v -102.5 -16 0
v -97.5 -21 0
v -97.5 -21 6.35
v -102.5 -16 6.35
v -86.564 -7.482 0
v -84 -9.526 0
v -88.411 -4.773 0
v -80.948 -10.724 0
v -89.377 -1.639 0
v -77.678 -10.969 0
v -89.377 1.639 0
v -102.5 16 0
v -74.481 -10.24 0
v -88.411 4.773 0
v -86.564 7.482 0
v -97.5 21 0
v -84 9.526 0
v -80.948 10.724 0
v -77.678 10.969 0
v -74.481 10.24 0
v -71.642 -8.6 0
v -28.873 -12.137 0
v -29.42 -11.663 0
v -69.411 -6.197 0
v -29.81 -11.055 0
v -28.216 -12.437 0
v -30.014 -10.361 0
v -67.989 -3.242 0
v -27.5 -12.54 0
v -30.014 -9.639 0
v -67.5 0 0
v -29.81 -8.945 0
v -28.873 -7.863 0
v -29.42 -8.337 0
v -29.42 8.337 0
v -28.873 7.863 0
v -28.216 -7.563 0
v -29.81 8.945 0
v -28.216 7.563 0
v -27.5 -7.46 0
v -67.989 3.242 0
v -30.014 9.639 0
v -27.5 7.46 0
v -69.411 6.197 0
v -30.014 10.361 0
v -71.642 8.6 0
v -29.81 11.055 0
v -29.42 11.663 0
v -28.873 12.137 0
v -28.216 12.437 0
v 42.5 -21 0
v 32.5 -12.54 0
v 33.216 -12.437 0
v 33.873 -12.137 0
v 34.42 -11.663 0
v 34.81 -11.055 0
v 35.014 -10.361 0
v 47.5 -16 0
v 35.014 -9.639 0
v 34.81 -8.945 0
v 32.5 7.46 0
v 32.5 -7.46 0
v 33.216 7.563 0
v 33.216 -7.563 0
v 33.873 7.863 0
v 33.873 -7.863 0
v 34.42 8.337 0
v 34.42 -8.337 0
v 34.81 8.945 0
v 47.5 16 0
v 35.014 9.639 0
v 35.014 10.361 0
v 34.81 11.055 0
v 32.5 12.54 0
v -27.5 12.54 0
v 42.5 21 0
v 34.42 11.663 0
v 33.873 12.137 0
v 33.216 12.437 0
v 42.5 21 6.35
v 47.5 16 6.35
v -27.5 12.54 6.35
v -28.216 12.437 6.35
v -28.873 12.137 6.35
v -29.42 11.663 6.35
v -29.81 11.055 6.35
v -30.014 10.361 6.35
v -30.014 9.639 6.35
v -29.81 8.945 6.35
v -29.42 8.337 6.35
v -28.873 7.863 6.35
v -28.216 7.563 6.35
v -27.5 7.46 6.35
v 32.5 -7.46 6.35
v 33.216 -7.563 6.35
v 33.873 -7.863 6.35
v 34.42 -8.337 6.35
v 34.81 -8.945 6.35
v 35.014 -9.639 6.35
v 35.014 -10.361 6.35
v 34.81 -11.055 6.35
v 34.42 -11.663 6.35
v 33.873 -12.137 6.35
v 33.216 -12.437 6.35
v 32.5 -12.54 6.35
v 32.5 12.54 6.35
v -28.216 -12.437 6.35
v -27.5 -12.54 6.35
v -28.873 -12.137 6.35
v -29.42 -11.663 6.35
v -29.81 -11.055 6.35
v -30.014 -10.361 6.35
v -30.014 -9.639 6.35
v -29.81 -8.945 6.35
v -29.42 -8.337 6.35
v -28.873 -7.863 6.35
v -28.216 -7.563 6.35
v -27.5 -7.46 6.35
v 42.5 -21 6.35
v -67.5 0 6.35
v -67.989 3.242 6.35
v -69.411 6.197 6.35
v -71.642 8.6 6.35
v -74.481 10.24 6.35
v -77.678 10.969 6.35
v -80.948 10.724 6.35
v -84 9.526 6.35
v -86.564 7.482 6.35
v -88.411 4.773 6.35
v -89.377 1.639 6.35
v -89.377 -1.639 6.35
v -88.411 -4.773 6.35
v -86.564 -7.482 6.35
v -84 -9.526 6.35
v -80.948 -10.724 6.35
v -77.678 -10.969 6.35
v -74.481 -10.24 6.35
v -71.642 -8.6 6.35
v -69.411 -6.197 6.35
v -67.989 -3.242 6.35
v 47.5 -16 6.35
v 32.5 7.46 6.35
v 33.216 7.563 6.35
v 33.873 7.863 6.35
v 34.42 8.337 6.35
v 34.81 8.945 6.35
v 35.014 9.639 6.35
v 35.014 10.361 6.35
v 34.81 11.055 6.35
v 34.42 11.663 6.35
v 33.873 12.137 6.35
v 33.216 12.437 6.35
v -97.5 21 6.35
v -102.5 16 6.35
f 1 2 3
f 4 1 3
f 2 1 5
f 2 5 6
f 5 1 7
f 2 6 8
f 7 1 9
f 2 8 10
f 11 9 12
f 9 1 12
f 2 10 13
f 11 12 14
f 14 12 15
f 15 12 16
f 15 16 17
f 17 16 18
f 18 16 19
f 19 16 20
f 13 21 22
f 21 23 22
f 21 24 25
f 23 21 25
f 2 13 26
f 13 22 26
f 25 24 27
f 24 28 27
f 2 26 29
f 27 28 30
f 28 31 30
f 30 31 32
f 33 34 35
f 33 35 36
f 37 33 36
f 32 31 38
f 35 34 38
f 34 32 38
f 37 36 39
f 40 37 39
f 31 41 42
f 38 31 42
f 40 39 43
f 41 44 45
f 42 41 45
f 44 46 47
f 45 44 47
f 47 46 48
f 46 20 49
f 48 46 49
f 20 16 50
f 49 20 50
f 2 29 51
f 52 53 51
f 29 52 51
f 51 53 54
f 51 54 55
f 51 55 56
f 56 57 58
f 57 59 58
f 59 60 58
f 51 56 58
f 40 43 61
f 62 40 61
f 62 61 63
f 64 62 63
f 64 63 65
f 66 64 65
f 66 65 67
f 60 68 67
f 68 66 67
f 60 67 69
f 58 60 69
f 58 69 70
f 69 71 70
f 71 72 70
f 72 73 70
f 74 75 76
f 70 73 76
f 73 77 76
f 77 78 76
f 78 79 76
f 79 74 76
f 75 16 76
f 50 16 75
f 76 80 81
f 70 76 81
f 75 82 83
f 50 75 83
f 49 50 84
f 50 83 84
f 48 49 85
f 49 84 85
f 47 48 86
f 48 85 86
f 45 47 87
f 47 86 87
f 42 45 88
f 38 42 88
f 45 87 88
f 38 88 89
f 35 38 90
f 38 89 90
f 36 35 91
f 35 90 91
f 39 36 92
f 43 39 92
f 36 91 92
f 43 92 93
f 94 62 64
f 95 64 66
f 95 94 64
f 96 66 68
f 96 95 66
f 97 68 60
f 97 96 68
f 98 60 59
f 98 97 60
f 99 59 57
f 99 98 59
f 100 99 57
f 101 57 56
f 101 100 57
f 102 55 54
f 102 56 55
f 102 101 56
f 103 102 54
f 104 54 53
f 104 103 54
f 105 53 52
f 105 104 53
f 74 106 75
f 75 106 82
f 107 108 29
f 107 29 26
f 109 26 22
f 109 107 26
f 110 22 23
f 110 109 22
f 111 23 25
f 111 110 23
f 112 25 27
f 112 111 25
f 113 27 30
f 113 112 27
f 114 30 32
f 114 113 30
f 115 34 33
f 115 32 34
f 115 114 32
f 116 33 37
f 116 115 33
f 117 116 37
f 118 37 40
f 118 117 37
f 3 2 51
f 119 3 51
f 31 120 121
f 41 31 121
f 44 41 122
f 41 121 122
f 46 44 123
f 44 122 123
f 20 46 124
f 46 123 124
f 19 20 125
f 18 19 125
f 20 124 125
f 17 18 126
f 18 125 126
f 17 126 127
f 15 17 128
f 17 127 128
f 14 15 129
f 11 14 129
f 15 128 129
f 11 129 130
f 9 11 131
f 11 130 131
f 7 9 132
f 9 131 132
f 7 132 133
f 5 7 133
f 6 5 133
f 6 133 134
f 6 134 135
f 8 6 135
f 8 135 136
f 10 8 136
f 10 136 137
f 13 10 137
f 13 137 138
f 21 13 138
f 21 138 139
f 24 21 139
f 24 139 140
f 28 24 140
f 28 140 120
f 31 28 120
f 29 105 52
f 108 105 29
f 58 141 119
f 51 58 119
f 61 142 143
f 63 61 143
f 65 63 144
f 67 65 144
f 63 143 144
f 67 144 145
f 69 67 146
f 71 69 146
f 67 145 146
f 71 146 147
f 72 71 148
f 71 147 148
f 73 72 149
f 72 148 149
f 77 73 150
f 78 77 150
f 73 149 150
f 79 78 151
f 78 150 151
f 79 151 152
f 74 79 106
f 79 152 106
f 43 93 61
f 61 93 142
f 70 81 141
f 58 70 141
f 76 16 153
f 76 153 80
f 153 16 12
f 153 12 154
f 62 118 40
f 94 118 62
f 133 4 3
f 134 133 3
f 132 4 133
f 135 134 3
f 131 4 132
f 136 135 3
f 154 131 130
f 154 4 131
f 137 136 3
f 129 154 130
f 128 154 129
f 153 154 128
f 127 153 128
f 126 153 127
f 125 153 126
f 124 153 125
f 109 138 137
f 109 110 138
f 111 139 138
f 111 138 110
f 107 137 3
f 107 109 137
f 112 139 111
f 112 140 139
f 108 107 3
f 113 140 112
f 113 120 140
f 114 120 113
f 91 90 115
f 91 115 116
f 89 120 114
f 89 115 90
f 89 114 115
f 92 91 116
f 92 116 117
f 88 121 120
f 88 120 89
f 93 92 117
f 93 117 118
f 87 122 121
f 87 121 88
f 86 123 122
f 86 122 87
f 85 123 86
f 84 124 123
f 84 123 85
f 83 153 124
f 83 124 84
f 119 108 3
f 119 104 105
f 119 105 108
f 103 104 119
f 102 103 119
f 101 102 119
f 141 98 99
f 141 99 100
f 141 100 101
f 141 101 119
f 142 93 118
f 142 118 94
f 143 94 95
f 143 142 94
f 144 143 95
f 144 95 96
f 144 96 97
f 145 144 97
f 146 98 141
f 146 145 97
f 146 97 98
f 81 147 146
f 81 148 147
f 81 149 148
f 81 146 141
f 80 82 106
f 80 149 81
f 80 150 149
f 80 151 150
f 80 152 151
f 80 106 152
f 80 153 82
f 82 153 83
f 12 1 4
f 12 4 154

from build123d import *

# Parameters (mm, degrees)
SKETCH1_W           = 205
SKETCH1_H           = 42
BOSS_EXTRUDE1_DEPTH = 6.35
SKETCH4_R           = 11
CUT_EXTRUDE3_DEPTH  = 7.35
CHAMFER1_SIZE       = 5
SKETCH9_R           = 11
CUT_EXTRUDE8_DEPTH  = 7.35
SKETCH13_R          = 11
CUT_EXTRUDE10_DEPTH = 10


with BuildPart() as part:
    # Sketch1 → Boss-Extrude1 (new body)
    with BuildSketch(Plane.XY):
        Rectangle(SKETCH1_W, SKETCH1_H)
    extrude(amount=BOSS_EXTRUDE1_DEPTH)

    # Sketch4 → Cut-Extrude3 (cut, through all)
    with BuildSketch(Plane.XY.offset(6.35)):
        with Locations((-78.5, 0)):
            Circle(SKETCH4_R)
    extrude(amount=-CUT_EXTRUDE3_DEPTH, mode=Mode.SUBTRACT)

    # Chamfer1
    chamfer1_edges = [part.edges().sort_by_distance(p)[0] for p in [
        (102.5, -21, 3.175),
        (-102.5, -21, 3.175),
        (-102.5, 21, 3.175),
        (102.5, 21, 3.175),
    ]]
    chamfer(chamfer1_edges, length=CHAMFER1_SIZE)

    # Sketch9 → Cut-Extrude8 (cut, through all)
    with BuildSketch(Plane.XY.offset(6.35)):
        with Locations((82.5, 0)):
            Circle(SKETCH9_R)
    extrude(amount=-CUT_EXTRUDE8_DEPTH, mode=Mode.SUBTRACT)

    # Sketch13 → Cut-Extrude10 (cut)
    with BuildSketch(Plane.XY.offset(6.35)):
        Polygon((42.5, 21), (47.5, 16), (47.5, -16), (42.5, -21), (97.5, -21), (102.5, -16), (102.5, 16), (97.5, 21), align=None)
        with Locations((82.5, 0)):
            Circle(SKETCH13_R, mode=Mode.SUBTRACT)
        with BuildLine():
            Line((-27.5, 7.46), (32.5, 7.46))
            ThreePointArc((32.5, 7.46), (35.04, 10), (32.5, 12.54))
            Line((32.5, 12.54), (-27.5, 12.54))
            ThreePointArc((-27.5, 12.54), (-30.04, 10), (-27.5, 7.46))
        make_face()
        with BuildLine():
            ThreePointArc((32.5, -7.46), (35.04, -10), (32.5, -12.54))
            Line((32.5, -12.54), (-27.5, -12.54))
            ThreePointArc((-27.5, -12.54), (-30.04, -10), (-27.5, -7.46))
            Line((-27.5, -7.46), (32.5, -7.46))
        make_face()
    extrude(amount=-CUT_EXTRUDE10_DEPTH, mode=Mode.SUBTRACT)


solid = part.part
